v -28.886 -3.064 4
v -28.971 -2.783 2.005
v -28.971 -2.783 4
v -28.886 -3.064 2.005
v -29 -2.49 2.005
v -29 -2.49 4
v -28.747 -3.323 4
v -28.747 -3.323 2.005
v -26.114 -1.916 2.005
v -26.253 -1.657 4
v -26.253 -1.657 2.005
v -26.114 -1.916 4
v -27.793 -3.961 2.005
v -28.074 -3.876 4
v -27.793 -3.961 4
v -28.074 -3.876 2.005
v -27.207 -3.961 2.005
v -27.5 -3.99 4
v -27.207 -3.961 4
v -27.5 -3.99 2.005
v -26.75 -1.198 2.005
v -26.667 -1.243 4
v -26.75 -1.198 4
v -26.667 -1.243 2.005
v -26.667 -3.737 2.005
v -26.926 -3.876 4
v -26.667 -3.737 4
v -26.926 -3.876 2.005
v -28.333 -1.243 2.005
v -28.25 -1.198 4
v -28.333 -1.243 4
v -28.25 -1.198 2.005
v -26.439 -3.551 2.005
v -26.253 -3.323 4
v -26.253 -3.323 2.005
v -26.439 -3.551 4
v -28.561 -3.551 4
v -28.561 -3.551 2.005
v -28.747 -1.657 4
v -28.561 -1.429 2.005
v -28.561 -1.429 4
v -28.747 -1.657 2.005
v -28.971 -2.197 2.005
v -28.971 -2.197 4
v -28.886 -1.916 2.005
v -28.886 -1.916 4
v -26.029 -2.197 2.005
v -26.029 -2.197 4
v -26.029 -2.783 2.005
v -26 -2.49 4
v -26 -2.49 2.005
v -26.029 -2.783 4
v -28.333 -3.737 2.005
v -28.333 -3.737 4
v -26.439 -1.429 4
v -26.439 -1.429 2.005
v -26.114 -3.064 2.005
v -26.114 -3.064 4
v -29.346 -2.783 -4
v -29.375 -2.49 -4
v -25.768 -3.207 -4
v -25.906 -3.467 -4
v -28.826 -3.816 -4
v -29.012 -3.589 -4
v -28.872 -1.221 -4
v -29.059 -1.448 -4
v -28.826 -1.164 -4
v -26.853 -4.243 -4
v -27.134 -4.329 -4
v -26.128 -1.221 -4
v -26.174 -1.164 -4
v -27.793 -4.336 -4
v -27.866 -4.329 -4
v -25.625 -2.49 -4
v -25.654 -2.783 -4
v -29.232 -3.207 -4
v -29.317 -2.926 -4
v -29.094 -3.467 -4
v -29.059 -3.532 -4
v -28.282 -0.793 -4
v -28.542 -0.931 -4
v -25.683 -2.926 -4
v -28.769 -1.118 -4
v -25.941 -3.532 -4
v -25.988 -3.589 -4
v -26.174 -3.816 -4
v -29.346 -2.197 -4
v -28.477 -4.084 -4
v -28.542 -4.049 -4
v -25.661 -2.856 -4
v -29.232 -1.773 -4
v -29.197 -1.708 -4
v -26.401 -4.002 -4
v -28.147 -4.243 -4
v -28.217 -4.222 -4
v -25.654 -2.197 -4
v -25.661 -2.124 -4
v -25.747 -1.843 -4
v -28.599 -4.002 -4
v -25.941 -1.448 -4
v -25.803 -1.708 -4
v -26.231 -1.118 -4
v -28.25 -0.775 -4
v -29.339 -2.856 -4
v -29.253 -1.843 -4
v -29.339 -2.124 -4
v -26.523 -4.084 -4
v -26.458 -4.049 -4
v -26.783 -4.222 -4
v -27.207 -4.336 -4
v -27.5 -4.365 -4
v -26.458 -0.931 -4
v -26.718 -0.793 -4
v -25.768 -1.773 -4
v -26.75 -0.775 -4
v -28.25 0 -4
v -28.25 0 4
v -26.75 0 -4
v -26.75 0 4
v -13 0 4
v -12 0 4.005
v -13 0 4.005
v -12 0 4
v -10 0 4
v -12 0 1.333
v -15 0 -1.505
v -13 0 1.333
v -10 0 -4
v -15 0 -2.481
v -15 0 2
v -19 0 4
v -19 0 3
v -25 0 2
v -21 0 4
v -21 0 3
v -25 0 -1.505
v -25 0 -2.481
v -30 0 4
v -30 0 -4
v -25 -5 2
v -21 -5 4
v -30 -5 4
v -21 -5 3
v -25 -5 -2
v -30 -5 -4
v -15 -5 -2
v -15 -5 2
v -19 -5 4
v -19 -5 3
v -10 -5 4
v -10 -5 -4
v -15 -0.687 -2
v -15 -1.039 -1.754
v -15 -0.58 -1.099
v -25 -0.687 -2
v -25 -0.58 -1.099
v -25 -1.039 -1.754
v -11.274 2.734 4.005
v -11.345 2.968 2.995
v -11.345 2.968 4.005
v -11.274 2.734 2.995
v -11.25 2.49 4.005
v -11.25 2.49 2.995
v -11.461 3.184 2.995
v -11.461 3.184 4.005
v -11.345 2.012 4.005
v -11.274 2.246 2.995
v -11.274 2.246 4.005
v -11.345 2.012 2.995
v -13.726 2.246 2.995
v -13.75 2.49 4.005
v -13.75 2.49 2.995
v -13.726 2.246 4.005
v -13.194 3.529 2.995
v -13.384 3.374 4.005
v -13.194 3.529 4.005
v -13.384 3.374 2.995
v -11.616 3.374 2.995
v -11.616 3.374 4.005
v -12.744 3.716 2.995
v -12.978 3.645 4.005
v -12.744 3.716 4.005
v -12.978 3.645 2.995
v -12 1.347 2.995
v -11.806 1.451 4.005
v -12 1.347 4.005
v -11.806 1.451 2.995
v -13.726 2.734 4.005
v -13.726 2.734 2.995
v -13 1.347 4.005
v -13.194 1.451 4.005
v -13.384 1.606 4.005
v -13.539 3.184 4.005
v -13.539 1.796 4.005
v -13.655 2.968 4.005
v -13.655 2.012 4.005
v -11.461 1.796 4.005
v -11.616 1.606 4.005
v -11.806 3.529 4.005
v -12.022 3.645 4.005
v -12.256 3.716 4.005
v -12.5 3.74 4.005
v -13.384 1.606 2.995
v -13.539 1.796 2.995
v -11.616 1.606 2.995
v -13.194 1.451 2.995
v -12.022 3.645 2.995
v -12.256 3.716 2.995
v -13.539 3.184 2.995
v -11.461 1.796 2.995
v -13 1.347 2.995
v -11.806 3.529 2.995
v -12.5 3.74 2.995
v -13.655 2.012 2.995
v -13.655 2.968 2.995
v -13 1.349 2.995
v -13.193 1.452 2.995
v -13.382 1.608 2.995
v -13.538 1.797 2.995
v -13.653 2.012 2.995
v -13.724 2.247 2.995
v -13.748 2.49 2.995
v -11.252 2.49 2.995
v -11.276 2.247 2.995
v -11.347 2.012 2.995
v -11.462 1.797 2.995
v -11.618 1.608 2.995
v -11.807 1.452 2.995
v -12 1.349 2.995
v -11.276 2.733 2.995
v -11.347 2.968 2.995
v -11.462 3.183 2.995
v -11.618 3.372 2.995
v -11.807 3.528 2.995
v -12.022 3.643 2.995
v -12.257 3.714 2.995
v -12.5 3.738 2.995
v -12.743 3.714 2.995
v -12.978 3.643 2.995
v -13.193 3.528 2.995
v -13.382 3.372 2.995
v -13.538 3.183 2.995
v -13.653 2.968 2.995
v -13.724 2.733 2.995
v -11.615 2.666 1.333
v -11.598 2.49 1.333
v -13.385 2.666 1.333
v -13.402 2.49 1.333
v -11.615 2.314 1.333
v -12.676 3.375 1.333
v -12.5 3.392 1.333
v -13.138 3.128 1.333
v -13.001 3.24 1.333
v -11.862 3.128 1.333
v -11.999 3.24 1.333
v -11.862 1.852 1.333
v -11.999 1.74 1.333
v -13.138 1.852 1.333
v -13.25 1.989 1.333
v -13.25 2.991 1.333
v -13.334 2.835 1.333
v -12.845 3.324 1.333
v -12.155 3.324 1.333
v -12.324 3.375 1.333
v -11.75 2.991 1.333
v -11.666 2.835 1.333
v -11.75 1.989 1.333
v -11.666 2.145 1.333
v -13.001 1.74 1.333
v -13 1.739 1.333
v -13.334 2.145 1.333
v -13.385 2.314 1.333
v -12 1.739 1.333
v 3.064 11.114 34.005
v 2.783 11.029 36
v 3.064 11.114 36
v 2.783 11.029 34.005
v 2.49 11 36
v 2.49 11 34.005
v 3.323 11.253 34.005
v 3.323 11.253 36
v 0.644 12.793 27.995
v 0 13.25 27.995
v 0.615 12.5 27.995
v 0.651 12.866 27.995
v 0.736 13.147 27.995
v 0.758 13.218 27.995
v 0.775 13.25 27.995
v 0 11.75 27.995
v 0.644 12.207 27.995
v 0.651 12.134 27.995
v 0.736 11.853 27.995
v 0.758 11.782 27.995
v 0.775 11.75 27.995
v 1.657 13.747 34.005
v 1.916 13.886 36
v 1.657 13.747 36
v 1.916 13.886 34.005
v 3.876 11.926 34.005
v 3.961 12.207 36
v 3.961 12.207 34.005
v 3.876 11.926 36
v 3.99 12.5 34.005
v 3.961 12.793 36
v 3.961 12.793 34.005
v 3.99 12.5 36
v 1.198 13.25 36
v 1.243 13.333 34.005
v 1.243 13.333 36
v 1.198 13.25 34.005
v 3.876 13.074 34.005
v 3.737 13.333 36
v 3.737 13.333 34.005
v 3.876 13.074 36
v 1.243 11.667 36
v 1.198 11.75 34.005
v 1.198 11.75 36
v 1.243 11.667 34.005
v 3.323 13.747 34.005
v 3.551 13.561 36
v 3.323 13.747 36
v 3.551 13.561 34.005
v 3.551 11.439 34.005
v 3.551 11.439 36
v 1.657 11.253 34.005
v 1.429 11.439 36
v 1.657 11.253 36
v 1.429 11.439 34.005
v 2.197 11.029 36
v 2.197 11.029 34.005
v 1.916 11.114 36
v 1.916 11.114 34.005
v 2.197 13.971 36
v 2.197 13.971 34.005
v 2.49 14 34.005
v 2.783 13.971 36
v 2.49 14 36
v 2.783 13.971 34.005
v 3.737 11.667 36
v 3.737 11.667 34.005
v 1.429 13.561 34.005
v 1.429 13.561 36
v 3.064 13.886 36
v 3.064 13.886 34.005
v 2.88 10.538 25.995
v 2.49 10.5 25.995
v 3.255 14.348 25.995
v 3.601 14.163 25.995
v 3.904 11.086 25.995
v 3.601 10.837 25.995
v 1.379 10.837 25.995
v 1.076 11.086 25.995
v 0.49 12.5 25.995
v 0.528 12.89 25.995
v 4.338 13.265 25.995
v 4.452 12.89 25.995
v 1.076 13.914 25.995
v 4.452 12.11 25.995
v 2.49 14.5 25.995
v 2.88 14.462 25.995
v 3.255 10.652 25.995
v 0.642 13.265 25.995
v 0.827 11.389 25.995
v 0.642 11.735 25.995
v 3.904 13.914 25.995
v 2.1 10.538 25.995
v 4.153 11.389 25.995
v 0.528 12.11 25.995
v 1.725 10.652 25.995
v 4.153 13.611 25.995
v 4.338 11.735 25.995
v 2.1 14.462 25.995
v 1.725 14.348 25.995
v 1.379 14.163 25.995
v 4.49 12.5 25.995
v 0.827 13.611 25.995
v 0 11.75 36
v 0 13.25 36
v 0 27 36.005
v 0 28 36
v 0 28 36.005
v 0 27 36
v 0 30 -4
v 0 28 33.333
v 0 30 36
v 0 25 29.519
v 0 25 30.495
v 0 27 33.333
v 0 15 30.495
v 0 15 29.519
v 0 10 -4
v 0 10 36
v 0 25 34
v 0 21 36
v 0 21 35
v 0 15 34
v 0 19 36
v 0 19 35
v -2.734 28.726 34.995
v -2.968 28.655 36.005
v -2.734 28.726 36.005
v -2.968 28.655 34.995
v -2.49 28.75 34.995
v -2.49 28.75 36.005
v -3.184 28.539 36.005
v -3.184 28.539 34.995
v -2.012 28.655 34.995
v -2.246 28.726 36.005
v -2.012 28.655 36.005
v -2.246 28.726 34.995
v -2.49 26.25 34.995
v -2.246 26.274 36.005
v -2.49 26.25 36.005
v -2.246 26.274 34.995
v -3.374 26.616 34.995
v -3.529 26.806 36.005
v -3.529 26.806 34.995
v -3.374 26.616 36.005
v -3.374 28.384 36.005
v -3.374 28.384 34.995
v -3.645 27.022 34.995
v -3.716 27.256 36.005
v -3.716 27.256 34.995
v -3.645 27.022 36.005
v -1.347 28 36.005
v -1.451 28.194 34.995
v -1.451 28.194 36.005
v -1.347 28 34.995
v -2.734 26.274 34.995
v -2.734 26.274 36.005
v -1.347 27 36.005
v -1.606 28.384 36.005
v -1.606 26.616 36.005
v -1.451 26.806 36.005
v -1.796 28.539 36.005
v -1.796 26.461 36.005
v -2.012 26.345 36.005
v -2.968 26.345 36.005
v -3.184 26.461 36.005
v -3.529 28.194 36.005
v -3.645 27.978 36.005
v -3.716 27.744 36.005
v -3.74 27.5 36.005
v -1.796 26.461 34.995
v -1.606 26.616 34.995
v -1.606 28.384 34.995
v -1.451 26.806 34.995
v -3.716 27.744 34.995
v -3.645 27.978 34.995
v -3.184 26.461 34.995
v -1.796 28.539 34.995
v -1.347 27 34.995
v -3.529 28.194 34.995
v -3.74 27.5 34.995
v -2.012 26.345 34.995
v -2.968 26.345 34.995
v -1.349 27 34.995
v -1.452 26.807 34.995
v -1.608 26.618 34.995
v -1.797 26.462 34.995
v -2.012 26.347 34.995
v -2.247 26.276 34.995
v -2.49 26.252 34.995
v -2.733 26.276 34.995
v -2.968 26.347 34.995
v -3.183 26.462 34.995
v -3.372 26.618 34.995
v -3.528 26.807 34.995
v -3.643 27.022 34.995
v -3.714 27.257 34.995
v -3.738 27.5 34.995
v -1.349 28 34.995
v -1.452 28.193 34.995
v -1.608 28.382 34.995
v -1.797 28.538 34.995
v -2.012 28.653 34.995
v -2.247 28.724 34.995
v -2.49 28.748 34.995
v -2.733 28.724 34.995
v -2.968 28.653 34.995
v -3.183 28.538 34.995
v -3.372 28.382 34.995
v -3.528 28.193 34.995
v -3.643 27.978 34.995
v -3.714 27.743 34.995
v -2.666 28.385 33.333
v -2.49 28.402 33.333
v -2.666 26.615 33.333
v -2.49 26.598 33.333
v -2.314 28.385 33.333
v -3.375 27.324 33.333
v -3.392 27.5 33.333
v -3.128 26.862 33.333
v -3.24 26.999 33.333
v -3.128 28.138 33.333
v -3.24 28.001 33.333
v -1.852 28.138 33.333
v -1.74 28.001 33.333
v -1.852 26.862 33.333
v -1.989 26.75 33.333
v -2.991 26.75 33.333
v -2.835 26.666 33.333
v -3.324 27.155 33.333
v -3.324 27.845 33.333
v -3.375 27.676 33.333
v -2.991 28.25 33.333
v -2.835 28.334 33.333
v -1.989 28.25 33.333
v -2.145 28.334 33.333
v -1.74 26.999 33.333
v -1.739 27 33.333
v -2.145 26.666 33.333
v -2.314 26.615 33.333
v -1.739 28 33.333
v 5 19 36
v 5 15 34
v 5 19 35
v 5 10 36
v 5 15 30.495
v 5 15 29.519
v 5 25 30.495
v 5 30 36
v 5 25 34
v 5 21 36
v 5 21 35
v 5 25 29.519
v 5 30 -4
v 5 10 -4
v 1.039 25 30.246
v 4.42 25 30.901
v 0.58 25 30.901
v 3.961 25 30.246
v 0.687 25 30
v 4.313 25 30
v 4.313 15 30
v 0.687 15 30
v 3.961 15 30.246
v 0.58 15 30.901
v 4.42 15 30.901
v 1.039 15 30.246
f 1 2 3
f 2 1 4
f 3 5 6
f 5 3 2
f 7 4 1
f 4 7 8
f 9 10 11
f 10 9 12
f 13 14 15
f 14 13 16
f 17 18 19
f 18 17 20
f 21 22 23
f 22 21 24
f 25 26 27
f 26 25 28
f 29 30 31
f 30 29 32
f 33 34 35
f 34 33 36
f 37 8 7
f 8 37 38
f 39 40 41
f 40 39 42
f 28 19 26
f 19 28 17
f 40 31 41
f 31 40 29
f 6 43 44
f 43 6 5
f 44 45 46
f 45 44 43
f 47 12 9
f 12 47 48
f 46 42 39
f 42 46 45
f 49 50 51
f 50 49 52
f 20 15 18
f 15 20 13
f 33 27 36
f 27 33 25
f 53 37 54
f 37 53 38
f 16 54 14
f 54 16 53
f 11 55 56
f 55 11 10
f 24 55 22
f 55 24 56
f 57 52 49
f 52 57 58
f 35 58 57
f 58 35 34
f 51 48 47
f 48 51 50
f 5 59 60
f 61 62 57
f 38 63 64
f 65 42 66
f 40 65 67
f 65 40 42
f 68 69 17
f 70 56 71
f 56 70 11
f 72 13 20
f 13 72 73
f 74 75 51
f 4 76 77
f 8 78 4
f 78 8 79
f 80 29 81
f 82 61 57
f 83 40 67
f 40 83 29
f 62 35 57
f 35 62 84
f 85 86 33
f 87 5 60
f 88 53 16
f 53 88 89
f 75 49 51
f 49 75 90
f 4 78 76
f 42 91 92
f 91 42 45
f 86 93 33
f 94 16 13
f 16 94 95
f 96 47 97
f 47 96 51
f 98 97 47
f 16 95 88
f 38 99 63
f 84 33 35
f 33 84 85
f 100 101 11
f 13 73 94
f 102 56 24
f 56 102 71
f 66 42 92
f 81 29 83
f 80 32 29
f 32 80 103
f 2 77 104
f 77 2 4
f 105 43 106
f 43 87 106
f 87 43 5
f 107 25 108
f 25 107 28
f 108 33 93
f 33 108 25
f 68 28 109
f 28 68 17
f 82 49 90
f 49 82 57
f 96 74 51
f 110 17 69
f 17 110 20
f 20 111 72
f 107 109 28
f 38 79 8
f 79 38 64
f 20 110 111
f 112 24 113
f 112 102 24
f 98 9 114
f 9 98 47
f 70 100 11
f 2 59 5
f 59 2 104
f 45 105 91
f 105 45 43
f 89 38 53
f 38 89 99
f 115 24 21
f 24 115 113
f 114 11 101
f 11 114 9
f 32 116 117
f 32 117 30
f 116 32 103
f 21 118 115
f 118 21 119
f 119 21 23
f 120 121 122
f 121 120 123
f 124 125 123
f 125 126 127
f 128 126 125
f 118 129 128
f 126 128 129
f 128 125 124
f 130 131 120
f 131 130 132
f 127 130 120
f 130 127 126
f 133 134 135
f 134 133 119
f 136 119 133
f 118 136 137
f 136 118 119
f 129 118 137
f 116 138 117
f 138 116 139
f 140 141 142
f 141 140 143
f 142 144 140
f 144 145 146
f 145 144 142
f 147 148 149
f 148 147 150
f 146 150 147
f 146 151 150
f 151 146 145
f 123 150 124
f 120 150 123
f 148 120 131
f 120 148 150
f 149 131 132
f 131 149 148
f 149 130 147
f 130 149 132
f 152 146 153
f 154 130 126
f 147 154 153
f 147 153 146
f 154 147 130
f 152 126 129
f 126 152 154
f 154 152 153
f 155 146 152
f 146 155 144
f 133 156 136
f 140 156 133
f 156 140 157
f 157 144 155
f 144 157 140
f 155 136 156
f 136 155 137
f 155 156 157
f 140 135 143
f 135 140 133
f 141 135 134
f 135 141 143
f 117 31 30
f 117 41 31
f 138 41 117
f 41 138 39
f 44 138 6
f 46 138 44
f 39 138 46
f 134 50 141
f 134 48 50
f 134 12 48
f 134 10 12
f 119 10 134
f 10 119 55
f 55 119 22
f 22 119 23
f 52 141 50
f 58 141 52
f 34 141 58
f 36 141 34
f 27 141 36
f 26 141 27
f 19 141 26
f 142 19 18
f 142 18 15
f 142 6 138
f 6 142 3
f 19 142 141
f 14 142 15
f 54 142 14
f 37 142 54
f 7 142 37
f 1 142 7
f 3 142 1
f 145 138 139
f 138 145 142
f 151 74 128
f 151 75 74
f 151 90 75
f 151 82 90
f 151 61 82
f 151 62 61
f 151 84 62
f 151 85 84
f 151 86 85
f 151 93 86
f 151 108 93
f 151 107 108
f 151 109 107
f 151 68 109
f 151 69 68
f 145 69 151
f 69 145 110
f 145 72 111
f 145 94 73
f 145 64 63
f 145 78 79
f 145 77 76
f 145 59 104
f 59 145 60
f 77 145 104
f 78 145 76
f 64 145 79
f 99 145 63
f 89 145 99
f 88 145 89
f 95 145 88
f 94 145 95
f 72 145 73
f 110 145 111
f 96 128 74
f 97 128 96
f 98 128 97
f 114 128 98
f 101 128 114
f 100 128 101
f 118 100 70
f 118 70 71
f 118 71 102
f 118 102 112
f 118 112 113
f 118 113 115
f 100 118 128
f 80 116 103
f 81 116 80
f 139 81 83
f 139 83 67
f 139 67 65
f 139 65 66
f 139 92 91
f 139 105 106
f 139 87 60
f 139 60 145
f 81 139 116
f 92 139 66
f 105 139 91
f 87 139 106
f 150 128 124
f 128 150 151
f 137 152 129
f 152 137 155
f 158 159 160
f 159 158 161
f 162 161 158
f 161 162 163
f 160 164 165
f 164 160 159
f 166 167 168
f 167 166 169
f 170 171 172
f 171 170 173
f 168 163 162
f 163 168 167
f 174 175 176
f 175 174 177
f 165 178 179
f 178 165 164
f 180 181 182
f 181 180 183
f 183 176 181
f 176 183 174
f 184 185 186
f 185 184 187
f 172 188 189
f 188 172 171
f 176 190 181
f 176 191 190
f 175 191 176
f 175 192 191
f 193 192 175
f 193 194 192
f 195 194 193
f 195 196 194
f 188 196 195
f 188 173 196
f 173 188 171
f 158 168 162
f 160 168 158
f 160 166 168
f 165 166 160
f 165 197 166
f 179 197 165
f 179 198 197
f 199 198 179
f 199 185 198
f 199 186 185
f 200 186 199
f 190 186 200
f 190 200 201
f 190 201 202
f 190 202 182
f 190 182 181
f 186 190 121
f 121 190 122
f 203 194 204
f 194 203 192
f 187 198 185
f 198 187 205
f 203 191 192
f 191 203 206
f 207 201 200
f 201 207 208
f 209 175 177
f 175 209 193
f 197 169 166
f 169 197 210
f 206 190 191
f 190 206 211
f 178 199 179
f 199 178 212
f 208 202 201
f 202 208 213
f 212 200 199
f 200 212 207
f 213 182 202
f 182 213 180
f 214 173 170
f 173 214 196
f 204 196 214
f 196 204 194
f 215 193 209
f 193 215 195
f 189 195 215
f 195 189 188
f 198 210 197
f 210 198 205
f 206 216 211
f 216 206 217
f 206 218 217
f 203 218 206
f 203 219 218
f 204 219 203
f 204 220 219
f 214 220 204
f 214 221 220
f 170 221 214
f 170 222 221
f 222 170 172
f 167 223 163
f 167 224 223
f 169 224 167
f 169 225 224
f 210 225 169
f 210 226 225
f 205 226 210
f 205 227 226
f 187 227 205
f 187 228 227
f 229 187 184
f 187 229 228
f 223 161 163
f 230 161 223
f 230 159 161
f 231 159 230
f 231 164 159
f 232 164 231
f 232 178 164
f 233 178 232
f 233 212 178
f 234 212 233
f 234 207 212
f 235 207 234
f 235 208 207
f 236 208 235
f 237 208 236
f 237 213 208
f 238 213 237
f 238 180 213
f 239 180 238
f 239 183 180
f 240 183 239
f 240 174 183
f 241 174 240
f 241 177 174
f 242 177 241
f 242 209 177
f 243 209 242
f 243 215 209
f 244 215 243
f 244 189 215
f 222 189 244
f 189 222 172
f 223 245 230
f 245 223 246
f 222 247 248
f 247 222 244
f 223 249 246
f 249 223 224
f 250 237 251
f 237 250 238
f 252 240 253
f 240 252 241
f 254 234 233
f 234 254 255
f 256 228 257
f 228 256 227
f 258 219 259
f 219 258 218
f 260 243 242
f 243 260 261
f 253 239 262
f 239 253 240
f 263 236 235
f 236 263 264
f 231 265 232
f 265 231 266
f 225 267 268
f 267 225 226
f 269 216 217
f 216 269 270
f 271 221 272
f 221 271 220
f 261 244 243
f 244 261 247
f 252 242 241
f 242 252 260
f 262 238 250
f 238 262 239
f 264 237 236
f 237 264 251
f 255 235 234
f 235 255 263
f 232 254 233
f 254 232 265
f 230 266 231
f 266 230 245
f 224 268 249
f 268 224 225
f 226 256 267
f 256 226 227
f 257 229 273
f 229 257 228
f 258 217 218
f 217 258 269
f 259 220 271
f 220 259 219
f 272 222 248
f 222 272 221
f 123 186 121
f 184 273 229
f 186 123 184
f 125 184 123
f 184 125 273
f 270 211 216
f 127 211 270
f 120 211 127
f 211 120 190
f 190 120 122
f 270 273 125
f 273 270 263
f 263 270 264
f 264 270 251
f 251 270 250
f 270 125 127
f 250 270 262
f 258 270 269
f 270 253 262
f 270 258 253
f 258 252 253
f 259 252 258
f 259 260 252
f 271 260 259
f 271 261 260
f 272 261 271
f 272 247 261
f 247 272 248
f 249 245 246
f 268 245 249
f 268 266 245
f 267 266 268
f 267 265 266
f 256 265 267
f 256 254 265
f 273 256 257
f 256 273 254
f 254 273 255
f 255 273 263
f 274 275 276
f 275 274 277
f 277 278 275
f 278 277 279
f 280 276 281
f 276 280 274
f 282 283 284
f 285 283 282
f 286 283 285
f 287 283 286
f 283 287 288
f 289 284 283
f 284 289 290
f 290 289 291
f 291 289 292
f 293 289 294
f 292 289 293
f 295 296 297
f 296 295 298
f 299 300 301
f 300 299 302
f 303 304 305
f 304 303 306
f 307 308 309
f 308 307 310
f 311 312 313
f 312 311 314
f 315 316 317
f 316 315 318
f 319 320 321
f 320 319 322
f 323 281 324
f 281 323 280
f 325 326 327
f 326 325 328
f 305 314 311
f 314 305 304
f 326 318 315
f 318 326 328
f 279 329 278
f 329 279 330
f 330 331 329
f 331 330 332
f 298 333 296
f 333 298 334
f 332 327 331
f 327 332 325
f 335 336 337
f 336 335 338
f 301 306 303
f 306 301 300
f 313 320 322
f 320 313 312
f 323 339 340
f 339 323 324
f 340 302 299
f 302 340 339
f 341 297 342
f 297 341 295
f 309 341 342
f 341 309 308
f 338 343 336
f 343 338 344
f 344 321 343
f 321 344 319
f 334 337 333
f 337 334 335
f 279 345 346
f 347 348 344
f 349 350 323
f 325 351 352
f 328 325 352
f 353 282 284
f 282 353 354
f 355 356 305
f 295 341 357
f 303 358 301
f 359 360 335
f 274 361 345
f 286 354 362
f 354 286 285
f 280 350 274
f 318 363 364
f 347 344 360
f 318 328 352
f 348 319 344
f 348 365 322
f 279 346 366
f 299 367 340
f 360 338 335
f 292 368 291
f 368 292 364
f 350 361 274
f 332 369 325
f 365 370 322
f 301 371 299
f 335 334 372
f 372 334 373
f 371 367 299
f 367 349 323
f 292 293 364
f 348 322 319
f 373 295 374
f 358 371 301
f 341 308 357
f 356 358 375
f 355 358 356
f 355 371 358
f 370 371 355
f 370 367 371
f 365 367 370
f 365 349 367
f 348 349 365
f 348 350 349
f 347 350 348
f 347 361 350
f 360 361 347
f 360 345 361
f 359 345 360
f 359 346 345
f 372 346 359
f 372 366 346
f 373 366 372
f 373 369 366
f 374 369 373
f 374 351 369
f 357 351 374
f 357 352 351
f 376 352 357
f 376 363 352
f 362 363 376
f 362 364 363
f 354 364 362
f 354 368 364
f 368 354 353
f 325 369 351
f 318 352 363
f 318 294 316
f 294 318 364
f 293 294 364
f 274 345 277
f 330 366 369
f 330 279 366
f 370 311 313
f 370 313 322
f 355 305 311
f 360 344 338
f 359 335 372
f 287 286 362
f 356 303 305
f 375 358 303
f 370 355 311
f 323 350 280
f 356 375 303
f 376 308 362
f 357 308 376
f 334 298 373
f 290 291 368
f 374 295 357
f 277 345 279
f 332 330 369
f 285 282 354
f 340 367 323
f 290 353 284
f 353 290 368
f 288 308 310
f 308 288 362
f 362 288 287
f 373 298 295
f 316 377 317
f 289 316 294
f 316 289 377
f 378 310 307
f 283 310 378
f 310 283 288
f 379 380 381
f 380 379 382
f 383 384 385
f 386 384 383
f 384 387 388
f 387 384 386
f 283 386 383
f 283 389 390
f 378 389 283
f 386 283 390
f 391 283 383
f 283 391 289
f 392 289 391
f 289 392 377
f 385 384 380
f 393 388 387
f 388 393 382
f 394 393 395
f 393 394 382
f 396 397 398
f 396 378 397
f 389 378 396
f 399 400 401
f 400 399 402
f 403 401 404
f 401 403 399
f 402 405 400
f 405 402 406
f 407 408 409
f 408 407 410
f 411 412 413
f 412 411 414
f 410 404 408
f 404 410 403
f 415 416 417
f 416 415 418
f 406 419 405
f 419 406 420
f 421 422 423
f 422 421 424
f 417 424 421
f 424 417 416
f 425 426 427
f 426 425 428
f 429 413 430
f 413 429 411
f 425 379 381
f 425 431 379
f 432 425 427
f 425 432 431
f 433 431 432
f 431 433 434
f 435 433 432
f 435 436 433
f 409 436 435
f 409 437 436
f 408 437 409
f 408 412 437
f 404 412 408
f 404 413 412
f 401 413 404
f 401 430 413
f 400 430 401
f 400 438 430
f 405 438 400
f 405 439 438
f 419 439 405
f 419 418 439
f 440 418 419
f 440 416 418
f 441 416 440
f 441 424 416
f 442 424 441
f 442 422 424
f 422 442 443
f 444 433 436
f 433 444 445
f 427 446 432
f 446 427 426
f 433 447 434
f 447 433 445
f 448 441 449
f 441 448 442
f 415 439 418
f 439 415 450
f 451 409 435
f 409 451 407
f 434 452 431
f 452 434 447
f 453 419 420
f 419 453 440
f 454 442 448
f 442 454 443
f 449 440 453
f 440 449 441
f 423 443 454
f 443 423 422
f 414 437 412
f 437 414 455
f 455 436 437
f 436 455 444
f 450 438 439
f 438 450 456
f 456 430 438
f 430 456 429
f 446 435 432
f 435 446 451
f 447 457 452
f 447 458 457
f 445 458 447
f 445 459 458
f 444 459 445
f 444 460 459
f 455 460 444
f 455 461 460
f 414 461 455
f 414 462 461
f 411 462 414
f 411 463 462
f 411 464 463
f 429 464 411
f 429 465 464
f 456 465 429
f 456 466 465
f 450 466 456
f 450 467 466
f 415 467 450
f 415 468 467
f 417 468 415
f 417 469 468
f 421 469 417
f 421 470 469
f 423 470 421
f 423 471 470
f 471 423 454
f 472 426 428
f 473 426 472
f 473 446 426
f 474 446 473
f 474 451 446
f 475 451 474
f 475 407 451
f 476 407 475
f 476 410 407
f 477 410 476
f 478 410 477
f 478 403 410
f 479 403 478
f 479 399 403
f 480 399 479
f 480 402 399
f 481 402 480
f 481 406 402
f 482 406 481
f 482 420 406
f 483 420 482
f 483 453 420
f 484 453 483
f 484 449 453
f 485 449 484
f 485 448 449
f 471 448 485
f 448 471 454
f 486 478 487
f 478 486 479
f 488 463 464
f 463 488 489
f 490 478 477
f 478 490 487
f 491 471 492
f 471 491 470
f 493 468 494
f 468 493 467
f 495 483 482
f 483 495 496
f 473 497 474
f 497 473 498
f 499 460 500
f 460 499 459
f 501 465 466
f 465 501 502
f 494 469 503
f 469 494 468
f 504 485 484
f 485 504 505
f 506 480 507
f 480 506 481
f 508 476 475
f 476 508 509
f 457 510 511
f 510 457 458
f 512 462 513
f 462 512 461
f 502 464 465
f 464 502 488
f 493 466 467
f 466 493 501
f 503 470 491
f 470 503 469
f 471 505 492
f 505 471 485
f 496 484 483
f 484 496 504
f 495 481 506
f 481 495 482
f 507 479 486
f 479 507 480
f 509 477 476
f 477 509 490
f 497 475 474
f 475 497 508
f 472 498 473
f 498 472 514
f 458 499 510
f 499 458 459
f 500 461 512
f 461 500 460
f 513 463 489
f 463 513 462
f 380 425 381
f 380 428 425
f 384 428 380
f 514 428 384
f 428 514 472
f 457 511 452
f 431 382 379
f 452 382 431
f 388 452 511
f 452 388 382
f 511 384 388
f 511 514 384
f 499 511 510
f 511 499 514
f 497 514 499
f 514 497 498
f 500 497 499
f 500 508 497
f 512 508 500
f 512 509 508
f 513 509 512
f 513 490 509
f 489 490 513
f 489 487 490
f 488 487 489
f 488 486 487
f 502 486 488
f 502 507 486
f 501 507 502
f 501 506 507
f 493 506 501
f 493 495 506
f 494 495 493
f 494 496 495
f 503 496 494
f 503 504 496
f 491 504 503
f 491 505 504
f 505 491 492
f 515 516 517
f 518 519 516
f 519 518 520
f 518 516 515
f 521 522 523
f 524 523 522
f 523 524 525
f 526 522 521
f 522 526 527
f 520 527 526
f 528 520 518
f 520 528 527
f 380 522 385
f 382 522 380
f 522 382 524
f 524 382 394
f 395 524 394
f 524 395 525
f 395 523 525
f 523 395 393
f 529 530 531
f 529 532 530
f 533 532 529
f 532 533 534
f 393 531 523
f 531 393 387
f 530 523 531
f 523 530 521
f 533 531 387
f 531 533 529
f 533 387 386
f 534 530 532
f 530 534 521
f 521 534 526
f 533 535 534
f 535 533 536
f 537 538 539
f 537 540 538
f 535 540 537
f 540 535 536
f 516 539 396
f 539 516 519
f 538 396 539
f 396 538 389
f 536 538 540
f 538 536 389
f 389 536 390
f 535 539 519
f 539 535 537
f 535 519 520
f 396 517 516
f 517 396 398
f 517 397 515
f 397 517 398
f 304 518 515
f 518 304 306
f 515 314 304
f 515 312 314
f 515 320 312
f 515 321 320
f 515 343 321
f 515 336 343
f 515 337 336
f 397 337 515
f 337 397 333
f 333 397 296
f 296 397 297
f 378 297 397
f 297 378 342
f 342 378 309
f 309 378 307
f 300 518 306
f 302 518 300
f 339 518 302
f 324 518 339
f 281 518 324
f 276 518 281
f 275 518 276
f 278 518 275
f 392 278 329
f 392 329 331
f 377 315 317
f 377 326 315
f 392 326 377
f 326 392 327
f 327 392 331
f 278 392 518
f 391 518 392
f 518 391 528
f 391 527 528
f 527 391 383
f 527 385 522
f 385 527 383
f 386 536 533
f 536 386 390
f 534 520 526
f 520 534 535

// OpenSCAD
/*

  ttt_curve270_ramp_3.scad

  (c) olikraus@gmail.com

  This work is licensed under the Creative Commons Attribution-NonCommercial-ShareAlike 4.0 International License. 
  To view a copy of this license, visit http://creativecommons.org/licenses/by-nc-sa/4.0/.

*/
include <train_tube_track.scad>;



ttt_curved270_ramp_3();
